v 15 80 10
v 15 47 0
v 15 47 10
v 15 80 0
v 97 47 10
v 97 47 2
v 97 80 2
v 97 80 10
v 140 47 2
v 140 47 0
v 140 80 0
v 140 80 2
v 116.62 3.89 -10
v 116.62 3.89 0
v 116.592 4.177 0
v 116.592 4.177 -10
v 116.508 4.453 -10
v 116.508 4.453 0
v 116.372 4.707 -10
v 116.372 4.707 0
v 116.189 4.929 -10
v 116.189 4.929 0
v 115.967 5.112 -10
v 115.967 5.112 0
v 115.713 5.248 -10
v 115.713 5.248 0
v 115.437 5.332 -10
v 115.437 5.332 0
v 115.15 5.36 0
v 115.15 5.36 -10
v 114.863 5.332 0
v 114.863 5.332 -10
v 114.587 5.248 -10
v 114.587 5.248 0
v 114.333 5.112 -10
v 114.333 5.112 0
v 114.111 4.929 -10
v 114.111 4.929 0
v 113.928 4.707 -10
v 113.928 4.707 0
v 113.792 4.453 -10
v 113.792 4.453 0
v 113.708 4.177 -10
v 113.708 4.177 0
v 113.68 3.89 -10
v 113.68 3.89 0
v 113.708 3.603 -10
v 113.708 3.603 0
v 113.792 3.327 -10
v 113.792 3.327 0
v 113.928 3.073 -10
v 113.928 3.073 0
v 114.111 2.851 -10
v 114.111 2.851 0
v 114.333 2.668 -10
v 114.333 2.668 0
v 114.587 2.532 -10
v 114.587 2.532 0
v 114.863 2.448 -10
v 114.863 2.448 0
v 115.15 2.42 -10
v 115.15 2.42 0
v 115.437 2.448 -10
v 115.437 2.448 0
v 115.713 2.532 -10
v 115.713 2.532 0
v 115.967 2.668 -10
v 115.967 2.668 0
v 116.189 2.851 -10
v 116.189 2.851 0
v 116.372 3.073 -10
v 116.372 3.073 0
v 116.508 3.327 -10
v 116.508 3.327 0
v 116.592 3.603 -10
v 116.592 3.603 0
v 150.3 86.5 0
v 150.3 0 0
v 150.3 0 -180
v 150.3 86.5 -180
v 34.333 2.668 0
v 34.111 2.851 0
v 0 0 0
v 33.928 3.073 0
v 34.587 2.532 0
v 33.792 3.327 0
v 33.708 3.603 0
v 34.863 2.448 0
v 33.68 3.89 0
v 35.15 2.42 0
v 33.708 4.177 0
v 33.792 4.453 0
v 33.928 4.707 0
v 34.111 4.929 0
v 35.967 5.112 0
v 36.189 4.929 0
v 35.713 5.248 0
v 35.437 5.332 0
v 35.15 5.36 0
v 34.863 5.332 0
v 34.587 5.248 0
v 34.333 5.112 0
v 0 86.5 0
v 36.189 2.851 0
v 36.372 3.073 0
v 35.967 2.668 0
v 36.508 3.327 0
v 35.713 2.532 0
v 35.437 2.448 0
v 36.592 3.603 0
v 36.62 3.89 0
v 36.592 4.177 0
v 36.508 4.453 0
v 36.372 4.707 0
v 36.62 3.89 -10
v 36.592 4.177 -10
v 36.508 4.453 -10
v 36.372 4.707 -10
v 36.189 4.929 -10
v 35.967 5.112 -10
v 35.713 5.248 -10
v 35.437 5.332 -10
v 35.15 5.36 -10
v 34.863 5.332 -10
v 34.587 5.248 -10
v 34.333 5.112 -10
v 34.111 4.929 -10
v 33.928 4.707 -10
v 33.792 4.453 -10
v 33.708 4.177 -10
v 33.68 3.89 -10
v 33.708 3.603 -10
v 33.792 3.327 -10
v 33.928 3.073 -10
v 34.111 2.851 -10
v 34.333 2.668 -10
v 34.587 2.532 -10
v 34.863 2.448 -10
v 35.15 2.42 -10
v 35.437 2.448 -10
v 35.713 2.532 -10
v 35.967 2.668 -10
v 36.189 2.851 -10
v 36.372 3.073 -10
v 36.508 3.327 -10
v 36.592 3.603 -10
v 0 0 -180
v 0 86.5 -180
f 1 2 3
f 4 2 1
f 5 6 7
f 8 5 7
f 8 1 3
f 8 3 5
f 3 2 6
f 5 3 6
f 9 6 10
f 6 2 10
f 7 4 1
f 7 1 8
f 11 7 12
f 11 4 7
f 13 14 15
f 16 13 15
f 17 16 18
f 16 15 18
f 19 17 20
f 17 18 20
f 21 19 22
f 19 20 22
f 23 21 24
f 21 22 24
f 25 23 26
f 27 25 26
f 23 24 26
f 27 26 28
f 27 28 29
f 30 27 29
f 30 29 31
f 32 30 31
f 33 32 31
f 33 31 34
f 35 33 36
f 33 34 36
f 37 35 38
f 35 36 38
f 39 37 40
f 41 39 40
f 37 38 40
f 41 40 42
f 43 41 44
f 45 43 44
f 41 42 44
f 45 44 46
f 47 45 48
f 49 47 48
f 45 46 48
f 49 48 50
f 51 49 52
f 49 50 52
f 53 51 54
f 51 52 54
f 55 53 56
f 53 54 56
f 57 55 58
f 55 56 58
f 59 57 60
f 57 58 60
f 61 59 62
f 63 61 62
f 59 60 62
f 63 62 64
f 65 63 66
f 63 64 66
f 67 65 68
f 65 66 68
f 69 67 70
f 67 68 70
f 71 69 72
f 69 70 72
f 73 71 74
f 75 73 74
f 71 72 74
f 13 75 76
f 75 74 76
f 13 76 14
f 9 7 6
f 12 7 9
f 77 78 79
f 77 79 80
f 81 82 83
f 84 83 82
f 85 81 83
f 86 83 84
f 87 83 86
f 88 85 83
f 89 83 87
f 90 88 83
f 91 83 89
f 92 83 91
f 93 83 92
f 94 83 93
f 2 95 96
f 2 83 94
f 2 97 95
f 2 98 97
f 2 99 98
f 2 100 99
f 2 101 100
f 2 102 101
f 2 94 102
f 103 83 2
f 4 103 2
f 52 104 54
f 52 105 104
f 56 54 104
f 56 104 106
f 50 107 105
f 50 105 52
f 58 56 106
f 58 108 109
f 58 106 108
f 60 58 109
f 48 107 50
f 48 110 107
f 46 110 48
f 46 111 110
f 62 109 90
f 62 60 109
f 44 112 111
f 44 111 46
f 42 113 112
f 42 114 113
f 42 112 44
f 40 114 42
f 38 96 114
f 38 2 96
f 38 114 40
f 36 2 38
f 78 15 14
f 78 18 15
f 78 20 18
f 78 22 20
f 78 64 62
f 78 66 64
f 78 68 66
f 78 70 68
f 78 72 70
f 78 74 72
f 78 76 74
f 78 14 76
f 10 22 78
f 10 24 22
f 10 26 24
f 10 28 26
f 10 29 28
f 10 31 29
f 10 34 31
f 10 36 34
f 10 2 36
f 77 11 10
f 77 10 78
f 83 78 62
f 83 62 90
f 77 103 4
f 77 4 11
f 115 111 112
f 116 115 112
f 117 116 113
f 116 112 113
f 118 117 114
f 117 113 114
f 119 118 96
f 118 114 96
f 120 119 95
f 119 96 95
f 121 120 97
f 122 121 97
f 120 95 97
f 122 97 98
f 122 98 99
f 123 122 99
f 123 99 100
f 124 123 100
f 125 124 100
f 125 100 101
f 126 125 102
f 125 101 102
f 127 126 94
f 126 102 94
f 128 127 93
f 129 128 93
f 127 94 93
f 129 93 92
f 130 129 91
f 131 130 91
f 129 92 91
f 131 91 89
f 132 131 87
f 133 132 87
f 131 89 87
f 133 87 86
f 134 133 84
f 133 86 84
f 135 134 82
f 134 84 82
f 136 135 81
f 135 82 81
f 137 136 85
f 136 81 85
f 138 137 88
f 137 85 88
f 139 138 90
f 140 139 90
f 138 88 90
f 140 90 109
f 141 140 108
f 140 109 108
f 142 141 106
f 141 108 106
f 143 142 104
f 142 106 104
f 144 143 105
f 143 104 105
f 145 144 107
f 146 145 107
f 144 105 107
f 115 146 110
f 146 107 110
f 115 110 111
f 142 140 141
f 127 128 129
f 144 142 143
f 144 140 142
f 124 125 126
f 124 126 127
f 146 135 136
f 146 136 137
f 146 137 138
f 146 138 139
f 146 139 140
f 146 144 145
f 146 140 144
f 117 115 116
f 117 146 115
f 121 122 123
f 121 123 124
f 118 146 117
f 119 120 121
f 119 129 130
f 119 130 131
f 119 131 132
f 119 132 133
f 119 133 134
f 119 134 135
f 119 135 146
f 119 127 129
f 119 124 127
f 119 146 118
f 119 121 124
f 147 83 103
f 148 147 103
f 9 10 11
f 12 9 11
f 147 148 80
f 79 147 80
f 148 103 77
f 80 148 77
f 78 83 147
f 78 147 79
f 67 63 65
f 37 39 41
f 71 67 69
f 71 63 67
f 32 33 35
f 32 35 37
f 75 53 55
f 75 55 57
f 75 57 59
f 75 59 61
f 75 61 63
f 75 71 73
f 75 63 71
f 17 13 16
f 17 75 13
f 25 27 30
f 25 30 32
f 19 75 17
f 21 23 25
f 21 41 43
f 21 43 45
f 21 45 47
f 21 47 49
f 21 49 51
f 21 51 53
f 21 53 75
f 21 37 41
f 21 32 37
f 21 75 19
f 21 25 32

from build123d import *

# Parameters (mm, degrees)
SKETCH1_W           = 150.3
SKETCH1_H           = 86.5
BOSS_EXTRUDE1_DEPTH = 180
SKETCH1_3_R         = 1.47
CUT_EXTRUDE1_DEPTH  = 10
SKETCH1_4_W         = 82
SKETCH1_4_H         = 33
BOSS_EXTRUDE2_DEPTH = 10
SKETCH1_5_W         = 43
SKETCH1_5_H         = 33
BOSS_EXTRUDE3_DEPTH = 2


with BuildPart() as part:
    # Sketch1 → Boss-Extrude1 (new body)
    with BuildSketch(Plane.XY):
        with Locations((75.15, 43.25)):
            Rectangle(SKETCH1_W, SKETCH1_H)
    extrude(amount=-BOSS_EXTRUDE1_DEPTH)

    # Sketch1<3> → Cut-Extrude1 (cut)
    with BuildSketch(Plane.XY):
        with Locations((35.15, 3.89)):
            Circle(SKETCH1_3_R)
        with Locations((115.15, 3.89)):
            Circle(SKETCH1_3_R)
    extrude(amount=-CUT_EXTRUDE1_DEPTH, mode=Mode.SUBTRACT)

    # Sketch1<4> → Boss-Extrude2 (add)
    with BuildSketch(Plane.XY):
        with Locations((56, 63.5)):
            Rectangle(SKETCH1_4_W, SKETCH1_4_H)
    extrude(amount=BOSS_EXTRUDE2_DEPTH)

    # Sketch1<5> → Boss-Extrude3 (add)
    with BuildSketch(Plane.XY):
        with Locations((118.5, 63.5)):
            Rectangle(SKETCH1_5_W, SKETCH1_5_H)
    extrude(amount=BOSS_EXTRUDE3_DEPTH)


solid = part.part
